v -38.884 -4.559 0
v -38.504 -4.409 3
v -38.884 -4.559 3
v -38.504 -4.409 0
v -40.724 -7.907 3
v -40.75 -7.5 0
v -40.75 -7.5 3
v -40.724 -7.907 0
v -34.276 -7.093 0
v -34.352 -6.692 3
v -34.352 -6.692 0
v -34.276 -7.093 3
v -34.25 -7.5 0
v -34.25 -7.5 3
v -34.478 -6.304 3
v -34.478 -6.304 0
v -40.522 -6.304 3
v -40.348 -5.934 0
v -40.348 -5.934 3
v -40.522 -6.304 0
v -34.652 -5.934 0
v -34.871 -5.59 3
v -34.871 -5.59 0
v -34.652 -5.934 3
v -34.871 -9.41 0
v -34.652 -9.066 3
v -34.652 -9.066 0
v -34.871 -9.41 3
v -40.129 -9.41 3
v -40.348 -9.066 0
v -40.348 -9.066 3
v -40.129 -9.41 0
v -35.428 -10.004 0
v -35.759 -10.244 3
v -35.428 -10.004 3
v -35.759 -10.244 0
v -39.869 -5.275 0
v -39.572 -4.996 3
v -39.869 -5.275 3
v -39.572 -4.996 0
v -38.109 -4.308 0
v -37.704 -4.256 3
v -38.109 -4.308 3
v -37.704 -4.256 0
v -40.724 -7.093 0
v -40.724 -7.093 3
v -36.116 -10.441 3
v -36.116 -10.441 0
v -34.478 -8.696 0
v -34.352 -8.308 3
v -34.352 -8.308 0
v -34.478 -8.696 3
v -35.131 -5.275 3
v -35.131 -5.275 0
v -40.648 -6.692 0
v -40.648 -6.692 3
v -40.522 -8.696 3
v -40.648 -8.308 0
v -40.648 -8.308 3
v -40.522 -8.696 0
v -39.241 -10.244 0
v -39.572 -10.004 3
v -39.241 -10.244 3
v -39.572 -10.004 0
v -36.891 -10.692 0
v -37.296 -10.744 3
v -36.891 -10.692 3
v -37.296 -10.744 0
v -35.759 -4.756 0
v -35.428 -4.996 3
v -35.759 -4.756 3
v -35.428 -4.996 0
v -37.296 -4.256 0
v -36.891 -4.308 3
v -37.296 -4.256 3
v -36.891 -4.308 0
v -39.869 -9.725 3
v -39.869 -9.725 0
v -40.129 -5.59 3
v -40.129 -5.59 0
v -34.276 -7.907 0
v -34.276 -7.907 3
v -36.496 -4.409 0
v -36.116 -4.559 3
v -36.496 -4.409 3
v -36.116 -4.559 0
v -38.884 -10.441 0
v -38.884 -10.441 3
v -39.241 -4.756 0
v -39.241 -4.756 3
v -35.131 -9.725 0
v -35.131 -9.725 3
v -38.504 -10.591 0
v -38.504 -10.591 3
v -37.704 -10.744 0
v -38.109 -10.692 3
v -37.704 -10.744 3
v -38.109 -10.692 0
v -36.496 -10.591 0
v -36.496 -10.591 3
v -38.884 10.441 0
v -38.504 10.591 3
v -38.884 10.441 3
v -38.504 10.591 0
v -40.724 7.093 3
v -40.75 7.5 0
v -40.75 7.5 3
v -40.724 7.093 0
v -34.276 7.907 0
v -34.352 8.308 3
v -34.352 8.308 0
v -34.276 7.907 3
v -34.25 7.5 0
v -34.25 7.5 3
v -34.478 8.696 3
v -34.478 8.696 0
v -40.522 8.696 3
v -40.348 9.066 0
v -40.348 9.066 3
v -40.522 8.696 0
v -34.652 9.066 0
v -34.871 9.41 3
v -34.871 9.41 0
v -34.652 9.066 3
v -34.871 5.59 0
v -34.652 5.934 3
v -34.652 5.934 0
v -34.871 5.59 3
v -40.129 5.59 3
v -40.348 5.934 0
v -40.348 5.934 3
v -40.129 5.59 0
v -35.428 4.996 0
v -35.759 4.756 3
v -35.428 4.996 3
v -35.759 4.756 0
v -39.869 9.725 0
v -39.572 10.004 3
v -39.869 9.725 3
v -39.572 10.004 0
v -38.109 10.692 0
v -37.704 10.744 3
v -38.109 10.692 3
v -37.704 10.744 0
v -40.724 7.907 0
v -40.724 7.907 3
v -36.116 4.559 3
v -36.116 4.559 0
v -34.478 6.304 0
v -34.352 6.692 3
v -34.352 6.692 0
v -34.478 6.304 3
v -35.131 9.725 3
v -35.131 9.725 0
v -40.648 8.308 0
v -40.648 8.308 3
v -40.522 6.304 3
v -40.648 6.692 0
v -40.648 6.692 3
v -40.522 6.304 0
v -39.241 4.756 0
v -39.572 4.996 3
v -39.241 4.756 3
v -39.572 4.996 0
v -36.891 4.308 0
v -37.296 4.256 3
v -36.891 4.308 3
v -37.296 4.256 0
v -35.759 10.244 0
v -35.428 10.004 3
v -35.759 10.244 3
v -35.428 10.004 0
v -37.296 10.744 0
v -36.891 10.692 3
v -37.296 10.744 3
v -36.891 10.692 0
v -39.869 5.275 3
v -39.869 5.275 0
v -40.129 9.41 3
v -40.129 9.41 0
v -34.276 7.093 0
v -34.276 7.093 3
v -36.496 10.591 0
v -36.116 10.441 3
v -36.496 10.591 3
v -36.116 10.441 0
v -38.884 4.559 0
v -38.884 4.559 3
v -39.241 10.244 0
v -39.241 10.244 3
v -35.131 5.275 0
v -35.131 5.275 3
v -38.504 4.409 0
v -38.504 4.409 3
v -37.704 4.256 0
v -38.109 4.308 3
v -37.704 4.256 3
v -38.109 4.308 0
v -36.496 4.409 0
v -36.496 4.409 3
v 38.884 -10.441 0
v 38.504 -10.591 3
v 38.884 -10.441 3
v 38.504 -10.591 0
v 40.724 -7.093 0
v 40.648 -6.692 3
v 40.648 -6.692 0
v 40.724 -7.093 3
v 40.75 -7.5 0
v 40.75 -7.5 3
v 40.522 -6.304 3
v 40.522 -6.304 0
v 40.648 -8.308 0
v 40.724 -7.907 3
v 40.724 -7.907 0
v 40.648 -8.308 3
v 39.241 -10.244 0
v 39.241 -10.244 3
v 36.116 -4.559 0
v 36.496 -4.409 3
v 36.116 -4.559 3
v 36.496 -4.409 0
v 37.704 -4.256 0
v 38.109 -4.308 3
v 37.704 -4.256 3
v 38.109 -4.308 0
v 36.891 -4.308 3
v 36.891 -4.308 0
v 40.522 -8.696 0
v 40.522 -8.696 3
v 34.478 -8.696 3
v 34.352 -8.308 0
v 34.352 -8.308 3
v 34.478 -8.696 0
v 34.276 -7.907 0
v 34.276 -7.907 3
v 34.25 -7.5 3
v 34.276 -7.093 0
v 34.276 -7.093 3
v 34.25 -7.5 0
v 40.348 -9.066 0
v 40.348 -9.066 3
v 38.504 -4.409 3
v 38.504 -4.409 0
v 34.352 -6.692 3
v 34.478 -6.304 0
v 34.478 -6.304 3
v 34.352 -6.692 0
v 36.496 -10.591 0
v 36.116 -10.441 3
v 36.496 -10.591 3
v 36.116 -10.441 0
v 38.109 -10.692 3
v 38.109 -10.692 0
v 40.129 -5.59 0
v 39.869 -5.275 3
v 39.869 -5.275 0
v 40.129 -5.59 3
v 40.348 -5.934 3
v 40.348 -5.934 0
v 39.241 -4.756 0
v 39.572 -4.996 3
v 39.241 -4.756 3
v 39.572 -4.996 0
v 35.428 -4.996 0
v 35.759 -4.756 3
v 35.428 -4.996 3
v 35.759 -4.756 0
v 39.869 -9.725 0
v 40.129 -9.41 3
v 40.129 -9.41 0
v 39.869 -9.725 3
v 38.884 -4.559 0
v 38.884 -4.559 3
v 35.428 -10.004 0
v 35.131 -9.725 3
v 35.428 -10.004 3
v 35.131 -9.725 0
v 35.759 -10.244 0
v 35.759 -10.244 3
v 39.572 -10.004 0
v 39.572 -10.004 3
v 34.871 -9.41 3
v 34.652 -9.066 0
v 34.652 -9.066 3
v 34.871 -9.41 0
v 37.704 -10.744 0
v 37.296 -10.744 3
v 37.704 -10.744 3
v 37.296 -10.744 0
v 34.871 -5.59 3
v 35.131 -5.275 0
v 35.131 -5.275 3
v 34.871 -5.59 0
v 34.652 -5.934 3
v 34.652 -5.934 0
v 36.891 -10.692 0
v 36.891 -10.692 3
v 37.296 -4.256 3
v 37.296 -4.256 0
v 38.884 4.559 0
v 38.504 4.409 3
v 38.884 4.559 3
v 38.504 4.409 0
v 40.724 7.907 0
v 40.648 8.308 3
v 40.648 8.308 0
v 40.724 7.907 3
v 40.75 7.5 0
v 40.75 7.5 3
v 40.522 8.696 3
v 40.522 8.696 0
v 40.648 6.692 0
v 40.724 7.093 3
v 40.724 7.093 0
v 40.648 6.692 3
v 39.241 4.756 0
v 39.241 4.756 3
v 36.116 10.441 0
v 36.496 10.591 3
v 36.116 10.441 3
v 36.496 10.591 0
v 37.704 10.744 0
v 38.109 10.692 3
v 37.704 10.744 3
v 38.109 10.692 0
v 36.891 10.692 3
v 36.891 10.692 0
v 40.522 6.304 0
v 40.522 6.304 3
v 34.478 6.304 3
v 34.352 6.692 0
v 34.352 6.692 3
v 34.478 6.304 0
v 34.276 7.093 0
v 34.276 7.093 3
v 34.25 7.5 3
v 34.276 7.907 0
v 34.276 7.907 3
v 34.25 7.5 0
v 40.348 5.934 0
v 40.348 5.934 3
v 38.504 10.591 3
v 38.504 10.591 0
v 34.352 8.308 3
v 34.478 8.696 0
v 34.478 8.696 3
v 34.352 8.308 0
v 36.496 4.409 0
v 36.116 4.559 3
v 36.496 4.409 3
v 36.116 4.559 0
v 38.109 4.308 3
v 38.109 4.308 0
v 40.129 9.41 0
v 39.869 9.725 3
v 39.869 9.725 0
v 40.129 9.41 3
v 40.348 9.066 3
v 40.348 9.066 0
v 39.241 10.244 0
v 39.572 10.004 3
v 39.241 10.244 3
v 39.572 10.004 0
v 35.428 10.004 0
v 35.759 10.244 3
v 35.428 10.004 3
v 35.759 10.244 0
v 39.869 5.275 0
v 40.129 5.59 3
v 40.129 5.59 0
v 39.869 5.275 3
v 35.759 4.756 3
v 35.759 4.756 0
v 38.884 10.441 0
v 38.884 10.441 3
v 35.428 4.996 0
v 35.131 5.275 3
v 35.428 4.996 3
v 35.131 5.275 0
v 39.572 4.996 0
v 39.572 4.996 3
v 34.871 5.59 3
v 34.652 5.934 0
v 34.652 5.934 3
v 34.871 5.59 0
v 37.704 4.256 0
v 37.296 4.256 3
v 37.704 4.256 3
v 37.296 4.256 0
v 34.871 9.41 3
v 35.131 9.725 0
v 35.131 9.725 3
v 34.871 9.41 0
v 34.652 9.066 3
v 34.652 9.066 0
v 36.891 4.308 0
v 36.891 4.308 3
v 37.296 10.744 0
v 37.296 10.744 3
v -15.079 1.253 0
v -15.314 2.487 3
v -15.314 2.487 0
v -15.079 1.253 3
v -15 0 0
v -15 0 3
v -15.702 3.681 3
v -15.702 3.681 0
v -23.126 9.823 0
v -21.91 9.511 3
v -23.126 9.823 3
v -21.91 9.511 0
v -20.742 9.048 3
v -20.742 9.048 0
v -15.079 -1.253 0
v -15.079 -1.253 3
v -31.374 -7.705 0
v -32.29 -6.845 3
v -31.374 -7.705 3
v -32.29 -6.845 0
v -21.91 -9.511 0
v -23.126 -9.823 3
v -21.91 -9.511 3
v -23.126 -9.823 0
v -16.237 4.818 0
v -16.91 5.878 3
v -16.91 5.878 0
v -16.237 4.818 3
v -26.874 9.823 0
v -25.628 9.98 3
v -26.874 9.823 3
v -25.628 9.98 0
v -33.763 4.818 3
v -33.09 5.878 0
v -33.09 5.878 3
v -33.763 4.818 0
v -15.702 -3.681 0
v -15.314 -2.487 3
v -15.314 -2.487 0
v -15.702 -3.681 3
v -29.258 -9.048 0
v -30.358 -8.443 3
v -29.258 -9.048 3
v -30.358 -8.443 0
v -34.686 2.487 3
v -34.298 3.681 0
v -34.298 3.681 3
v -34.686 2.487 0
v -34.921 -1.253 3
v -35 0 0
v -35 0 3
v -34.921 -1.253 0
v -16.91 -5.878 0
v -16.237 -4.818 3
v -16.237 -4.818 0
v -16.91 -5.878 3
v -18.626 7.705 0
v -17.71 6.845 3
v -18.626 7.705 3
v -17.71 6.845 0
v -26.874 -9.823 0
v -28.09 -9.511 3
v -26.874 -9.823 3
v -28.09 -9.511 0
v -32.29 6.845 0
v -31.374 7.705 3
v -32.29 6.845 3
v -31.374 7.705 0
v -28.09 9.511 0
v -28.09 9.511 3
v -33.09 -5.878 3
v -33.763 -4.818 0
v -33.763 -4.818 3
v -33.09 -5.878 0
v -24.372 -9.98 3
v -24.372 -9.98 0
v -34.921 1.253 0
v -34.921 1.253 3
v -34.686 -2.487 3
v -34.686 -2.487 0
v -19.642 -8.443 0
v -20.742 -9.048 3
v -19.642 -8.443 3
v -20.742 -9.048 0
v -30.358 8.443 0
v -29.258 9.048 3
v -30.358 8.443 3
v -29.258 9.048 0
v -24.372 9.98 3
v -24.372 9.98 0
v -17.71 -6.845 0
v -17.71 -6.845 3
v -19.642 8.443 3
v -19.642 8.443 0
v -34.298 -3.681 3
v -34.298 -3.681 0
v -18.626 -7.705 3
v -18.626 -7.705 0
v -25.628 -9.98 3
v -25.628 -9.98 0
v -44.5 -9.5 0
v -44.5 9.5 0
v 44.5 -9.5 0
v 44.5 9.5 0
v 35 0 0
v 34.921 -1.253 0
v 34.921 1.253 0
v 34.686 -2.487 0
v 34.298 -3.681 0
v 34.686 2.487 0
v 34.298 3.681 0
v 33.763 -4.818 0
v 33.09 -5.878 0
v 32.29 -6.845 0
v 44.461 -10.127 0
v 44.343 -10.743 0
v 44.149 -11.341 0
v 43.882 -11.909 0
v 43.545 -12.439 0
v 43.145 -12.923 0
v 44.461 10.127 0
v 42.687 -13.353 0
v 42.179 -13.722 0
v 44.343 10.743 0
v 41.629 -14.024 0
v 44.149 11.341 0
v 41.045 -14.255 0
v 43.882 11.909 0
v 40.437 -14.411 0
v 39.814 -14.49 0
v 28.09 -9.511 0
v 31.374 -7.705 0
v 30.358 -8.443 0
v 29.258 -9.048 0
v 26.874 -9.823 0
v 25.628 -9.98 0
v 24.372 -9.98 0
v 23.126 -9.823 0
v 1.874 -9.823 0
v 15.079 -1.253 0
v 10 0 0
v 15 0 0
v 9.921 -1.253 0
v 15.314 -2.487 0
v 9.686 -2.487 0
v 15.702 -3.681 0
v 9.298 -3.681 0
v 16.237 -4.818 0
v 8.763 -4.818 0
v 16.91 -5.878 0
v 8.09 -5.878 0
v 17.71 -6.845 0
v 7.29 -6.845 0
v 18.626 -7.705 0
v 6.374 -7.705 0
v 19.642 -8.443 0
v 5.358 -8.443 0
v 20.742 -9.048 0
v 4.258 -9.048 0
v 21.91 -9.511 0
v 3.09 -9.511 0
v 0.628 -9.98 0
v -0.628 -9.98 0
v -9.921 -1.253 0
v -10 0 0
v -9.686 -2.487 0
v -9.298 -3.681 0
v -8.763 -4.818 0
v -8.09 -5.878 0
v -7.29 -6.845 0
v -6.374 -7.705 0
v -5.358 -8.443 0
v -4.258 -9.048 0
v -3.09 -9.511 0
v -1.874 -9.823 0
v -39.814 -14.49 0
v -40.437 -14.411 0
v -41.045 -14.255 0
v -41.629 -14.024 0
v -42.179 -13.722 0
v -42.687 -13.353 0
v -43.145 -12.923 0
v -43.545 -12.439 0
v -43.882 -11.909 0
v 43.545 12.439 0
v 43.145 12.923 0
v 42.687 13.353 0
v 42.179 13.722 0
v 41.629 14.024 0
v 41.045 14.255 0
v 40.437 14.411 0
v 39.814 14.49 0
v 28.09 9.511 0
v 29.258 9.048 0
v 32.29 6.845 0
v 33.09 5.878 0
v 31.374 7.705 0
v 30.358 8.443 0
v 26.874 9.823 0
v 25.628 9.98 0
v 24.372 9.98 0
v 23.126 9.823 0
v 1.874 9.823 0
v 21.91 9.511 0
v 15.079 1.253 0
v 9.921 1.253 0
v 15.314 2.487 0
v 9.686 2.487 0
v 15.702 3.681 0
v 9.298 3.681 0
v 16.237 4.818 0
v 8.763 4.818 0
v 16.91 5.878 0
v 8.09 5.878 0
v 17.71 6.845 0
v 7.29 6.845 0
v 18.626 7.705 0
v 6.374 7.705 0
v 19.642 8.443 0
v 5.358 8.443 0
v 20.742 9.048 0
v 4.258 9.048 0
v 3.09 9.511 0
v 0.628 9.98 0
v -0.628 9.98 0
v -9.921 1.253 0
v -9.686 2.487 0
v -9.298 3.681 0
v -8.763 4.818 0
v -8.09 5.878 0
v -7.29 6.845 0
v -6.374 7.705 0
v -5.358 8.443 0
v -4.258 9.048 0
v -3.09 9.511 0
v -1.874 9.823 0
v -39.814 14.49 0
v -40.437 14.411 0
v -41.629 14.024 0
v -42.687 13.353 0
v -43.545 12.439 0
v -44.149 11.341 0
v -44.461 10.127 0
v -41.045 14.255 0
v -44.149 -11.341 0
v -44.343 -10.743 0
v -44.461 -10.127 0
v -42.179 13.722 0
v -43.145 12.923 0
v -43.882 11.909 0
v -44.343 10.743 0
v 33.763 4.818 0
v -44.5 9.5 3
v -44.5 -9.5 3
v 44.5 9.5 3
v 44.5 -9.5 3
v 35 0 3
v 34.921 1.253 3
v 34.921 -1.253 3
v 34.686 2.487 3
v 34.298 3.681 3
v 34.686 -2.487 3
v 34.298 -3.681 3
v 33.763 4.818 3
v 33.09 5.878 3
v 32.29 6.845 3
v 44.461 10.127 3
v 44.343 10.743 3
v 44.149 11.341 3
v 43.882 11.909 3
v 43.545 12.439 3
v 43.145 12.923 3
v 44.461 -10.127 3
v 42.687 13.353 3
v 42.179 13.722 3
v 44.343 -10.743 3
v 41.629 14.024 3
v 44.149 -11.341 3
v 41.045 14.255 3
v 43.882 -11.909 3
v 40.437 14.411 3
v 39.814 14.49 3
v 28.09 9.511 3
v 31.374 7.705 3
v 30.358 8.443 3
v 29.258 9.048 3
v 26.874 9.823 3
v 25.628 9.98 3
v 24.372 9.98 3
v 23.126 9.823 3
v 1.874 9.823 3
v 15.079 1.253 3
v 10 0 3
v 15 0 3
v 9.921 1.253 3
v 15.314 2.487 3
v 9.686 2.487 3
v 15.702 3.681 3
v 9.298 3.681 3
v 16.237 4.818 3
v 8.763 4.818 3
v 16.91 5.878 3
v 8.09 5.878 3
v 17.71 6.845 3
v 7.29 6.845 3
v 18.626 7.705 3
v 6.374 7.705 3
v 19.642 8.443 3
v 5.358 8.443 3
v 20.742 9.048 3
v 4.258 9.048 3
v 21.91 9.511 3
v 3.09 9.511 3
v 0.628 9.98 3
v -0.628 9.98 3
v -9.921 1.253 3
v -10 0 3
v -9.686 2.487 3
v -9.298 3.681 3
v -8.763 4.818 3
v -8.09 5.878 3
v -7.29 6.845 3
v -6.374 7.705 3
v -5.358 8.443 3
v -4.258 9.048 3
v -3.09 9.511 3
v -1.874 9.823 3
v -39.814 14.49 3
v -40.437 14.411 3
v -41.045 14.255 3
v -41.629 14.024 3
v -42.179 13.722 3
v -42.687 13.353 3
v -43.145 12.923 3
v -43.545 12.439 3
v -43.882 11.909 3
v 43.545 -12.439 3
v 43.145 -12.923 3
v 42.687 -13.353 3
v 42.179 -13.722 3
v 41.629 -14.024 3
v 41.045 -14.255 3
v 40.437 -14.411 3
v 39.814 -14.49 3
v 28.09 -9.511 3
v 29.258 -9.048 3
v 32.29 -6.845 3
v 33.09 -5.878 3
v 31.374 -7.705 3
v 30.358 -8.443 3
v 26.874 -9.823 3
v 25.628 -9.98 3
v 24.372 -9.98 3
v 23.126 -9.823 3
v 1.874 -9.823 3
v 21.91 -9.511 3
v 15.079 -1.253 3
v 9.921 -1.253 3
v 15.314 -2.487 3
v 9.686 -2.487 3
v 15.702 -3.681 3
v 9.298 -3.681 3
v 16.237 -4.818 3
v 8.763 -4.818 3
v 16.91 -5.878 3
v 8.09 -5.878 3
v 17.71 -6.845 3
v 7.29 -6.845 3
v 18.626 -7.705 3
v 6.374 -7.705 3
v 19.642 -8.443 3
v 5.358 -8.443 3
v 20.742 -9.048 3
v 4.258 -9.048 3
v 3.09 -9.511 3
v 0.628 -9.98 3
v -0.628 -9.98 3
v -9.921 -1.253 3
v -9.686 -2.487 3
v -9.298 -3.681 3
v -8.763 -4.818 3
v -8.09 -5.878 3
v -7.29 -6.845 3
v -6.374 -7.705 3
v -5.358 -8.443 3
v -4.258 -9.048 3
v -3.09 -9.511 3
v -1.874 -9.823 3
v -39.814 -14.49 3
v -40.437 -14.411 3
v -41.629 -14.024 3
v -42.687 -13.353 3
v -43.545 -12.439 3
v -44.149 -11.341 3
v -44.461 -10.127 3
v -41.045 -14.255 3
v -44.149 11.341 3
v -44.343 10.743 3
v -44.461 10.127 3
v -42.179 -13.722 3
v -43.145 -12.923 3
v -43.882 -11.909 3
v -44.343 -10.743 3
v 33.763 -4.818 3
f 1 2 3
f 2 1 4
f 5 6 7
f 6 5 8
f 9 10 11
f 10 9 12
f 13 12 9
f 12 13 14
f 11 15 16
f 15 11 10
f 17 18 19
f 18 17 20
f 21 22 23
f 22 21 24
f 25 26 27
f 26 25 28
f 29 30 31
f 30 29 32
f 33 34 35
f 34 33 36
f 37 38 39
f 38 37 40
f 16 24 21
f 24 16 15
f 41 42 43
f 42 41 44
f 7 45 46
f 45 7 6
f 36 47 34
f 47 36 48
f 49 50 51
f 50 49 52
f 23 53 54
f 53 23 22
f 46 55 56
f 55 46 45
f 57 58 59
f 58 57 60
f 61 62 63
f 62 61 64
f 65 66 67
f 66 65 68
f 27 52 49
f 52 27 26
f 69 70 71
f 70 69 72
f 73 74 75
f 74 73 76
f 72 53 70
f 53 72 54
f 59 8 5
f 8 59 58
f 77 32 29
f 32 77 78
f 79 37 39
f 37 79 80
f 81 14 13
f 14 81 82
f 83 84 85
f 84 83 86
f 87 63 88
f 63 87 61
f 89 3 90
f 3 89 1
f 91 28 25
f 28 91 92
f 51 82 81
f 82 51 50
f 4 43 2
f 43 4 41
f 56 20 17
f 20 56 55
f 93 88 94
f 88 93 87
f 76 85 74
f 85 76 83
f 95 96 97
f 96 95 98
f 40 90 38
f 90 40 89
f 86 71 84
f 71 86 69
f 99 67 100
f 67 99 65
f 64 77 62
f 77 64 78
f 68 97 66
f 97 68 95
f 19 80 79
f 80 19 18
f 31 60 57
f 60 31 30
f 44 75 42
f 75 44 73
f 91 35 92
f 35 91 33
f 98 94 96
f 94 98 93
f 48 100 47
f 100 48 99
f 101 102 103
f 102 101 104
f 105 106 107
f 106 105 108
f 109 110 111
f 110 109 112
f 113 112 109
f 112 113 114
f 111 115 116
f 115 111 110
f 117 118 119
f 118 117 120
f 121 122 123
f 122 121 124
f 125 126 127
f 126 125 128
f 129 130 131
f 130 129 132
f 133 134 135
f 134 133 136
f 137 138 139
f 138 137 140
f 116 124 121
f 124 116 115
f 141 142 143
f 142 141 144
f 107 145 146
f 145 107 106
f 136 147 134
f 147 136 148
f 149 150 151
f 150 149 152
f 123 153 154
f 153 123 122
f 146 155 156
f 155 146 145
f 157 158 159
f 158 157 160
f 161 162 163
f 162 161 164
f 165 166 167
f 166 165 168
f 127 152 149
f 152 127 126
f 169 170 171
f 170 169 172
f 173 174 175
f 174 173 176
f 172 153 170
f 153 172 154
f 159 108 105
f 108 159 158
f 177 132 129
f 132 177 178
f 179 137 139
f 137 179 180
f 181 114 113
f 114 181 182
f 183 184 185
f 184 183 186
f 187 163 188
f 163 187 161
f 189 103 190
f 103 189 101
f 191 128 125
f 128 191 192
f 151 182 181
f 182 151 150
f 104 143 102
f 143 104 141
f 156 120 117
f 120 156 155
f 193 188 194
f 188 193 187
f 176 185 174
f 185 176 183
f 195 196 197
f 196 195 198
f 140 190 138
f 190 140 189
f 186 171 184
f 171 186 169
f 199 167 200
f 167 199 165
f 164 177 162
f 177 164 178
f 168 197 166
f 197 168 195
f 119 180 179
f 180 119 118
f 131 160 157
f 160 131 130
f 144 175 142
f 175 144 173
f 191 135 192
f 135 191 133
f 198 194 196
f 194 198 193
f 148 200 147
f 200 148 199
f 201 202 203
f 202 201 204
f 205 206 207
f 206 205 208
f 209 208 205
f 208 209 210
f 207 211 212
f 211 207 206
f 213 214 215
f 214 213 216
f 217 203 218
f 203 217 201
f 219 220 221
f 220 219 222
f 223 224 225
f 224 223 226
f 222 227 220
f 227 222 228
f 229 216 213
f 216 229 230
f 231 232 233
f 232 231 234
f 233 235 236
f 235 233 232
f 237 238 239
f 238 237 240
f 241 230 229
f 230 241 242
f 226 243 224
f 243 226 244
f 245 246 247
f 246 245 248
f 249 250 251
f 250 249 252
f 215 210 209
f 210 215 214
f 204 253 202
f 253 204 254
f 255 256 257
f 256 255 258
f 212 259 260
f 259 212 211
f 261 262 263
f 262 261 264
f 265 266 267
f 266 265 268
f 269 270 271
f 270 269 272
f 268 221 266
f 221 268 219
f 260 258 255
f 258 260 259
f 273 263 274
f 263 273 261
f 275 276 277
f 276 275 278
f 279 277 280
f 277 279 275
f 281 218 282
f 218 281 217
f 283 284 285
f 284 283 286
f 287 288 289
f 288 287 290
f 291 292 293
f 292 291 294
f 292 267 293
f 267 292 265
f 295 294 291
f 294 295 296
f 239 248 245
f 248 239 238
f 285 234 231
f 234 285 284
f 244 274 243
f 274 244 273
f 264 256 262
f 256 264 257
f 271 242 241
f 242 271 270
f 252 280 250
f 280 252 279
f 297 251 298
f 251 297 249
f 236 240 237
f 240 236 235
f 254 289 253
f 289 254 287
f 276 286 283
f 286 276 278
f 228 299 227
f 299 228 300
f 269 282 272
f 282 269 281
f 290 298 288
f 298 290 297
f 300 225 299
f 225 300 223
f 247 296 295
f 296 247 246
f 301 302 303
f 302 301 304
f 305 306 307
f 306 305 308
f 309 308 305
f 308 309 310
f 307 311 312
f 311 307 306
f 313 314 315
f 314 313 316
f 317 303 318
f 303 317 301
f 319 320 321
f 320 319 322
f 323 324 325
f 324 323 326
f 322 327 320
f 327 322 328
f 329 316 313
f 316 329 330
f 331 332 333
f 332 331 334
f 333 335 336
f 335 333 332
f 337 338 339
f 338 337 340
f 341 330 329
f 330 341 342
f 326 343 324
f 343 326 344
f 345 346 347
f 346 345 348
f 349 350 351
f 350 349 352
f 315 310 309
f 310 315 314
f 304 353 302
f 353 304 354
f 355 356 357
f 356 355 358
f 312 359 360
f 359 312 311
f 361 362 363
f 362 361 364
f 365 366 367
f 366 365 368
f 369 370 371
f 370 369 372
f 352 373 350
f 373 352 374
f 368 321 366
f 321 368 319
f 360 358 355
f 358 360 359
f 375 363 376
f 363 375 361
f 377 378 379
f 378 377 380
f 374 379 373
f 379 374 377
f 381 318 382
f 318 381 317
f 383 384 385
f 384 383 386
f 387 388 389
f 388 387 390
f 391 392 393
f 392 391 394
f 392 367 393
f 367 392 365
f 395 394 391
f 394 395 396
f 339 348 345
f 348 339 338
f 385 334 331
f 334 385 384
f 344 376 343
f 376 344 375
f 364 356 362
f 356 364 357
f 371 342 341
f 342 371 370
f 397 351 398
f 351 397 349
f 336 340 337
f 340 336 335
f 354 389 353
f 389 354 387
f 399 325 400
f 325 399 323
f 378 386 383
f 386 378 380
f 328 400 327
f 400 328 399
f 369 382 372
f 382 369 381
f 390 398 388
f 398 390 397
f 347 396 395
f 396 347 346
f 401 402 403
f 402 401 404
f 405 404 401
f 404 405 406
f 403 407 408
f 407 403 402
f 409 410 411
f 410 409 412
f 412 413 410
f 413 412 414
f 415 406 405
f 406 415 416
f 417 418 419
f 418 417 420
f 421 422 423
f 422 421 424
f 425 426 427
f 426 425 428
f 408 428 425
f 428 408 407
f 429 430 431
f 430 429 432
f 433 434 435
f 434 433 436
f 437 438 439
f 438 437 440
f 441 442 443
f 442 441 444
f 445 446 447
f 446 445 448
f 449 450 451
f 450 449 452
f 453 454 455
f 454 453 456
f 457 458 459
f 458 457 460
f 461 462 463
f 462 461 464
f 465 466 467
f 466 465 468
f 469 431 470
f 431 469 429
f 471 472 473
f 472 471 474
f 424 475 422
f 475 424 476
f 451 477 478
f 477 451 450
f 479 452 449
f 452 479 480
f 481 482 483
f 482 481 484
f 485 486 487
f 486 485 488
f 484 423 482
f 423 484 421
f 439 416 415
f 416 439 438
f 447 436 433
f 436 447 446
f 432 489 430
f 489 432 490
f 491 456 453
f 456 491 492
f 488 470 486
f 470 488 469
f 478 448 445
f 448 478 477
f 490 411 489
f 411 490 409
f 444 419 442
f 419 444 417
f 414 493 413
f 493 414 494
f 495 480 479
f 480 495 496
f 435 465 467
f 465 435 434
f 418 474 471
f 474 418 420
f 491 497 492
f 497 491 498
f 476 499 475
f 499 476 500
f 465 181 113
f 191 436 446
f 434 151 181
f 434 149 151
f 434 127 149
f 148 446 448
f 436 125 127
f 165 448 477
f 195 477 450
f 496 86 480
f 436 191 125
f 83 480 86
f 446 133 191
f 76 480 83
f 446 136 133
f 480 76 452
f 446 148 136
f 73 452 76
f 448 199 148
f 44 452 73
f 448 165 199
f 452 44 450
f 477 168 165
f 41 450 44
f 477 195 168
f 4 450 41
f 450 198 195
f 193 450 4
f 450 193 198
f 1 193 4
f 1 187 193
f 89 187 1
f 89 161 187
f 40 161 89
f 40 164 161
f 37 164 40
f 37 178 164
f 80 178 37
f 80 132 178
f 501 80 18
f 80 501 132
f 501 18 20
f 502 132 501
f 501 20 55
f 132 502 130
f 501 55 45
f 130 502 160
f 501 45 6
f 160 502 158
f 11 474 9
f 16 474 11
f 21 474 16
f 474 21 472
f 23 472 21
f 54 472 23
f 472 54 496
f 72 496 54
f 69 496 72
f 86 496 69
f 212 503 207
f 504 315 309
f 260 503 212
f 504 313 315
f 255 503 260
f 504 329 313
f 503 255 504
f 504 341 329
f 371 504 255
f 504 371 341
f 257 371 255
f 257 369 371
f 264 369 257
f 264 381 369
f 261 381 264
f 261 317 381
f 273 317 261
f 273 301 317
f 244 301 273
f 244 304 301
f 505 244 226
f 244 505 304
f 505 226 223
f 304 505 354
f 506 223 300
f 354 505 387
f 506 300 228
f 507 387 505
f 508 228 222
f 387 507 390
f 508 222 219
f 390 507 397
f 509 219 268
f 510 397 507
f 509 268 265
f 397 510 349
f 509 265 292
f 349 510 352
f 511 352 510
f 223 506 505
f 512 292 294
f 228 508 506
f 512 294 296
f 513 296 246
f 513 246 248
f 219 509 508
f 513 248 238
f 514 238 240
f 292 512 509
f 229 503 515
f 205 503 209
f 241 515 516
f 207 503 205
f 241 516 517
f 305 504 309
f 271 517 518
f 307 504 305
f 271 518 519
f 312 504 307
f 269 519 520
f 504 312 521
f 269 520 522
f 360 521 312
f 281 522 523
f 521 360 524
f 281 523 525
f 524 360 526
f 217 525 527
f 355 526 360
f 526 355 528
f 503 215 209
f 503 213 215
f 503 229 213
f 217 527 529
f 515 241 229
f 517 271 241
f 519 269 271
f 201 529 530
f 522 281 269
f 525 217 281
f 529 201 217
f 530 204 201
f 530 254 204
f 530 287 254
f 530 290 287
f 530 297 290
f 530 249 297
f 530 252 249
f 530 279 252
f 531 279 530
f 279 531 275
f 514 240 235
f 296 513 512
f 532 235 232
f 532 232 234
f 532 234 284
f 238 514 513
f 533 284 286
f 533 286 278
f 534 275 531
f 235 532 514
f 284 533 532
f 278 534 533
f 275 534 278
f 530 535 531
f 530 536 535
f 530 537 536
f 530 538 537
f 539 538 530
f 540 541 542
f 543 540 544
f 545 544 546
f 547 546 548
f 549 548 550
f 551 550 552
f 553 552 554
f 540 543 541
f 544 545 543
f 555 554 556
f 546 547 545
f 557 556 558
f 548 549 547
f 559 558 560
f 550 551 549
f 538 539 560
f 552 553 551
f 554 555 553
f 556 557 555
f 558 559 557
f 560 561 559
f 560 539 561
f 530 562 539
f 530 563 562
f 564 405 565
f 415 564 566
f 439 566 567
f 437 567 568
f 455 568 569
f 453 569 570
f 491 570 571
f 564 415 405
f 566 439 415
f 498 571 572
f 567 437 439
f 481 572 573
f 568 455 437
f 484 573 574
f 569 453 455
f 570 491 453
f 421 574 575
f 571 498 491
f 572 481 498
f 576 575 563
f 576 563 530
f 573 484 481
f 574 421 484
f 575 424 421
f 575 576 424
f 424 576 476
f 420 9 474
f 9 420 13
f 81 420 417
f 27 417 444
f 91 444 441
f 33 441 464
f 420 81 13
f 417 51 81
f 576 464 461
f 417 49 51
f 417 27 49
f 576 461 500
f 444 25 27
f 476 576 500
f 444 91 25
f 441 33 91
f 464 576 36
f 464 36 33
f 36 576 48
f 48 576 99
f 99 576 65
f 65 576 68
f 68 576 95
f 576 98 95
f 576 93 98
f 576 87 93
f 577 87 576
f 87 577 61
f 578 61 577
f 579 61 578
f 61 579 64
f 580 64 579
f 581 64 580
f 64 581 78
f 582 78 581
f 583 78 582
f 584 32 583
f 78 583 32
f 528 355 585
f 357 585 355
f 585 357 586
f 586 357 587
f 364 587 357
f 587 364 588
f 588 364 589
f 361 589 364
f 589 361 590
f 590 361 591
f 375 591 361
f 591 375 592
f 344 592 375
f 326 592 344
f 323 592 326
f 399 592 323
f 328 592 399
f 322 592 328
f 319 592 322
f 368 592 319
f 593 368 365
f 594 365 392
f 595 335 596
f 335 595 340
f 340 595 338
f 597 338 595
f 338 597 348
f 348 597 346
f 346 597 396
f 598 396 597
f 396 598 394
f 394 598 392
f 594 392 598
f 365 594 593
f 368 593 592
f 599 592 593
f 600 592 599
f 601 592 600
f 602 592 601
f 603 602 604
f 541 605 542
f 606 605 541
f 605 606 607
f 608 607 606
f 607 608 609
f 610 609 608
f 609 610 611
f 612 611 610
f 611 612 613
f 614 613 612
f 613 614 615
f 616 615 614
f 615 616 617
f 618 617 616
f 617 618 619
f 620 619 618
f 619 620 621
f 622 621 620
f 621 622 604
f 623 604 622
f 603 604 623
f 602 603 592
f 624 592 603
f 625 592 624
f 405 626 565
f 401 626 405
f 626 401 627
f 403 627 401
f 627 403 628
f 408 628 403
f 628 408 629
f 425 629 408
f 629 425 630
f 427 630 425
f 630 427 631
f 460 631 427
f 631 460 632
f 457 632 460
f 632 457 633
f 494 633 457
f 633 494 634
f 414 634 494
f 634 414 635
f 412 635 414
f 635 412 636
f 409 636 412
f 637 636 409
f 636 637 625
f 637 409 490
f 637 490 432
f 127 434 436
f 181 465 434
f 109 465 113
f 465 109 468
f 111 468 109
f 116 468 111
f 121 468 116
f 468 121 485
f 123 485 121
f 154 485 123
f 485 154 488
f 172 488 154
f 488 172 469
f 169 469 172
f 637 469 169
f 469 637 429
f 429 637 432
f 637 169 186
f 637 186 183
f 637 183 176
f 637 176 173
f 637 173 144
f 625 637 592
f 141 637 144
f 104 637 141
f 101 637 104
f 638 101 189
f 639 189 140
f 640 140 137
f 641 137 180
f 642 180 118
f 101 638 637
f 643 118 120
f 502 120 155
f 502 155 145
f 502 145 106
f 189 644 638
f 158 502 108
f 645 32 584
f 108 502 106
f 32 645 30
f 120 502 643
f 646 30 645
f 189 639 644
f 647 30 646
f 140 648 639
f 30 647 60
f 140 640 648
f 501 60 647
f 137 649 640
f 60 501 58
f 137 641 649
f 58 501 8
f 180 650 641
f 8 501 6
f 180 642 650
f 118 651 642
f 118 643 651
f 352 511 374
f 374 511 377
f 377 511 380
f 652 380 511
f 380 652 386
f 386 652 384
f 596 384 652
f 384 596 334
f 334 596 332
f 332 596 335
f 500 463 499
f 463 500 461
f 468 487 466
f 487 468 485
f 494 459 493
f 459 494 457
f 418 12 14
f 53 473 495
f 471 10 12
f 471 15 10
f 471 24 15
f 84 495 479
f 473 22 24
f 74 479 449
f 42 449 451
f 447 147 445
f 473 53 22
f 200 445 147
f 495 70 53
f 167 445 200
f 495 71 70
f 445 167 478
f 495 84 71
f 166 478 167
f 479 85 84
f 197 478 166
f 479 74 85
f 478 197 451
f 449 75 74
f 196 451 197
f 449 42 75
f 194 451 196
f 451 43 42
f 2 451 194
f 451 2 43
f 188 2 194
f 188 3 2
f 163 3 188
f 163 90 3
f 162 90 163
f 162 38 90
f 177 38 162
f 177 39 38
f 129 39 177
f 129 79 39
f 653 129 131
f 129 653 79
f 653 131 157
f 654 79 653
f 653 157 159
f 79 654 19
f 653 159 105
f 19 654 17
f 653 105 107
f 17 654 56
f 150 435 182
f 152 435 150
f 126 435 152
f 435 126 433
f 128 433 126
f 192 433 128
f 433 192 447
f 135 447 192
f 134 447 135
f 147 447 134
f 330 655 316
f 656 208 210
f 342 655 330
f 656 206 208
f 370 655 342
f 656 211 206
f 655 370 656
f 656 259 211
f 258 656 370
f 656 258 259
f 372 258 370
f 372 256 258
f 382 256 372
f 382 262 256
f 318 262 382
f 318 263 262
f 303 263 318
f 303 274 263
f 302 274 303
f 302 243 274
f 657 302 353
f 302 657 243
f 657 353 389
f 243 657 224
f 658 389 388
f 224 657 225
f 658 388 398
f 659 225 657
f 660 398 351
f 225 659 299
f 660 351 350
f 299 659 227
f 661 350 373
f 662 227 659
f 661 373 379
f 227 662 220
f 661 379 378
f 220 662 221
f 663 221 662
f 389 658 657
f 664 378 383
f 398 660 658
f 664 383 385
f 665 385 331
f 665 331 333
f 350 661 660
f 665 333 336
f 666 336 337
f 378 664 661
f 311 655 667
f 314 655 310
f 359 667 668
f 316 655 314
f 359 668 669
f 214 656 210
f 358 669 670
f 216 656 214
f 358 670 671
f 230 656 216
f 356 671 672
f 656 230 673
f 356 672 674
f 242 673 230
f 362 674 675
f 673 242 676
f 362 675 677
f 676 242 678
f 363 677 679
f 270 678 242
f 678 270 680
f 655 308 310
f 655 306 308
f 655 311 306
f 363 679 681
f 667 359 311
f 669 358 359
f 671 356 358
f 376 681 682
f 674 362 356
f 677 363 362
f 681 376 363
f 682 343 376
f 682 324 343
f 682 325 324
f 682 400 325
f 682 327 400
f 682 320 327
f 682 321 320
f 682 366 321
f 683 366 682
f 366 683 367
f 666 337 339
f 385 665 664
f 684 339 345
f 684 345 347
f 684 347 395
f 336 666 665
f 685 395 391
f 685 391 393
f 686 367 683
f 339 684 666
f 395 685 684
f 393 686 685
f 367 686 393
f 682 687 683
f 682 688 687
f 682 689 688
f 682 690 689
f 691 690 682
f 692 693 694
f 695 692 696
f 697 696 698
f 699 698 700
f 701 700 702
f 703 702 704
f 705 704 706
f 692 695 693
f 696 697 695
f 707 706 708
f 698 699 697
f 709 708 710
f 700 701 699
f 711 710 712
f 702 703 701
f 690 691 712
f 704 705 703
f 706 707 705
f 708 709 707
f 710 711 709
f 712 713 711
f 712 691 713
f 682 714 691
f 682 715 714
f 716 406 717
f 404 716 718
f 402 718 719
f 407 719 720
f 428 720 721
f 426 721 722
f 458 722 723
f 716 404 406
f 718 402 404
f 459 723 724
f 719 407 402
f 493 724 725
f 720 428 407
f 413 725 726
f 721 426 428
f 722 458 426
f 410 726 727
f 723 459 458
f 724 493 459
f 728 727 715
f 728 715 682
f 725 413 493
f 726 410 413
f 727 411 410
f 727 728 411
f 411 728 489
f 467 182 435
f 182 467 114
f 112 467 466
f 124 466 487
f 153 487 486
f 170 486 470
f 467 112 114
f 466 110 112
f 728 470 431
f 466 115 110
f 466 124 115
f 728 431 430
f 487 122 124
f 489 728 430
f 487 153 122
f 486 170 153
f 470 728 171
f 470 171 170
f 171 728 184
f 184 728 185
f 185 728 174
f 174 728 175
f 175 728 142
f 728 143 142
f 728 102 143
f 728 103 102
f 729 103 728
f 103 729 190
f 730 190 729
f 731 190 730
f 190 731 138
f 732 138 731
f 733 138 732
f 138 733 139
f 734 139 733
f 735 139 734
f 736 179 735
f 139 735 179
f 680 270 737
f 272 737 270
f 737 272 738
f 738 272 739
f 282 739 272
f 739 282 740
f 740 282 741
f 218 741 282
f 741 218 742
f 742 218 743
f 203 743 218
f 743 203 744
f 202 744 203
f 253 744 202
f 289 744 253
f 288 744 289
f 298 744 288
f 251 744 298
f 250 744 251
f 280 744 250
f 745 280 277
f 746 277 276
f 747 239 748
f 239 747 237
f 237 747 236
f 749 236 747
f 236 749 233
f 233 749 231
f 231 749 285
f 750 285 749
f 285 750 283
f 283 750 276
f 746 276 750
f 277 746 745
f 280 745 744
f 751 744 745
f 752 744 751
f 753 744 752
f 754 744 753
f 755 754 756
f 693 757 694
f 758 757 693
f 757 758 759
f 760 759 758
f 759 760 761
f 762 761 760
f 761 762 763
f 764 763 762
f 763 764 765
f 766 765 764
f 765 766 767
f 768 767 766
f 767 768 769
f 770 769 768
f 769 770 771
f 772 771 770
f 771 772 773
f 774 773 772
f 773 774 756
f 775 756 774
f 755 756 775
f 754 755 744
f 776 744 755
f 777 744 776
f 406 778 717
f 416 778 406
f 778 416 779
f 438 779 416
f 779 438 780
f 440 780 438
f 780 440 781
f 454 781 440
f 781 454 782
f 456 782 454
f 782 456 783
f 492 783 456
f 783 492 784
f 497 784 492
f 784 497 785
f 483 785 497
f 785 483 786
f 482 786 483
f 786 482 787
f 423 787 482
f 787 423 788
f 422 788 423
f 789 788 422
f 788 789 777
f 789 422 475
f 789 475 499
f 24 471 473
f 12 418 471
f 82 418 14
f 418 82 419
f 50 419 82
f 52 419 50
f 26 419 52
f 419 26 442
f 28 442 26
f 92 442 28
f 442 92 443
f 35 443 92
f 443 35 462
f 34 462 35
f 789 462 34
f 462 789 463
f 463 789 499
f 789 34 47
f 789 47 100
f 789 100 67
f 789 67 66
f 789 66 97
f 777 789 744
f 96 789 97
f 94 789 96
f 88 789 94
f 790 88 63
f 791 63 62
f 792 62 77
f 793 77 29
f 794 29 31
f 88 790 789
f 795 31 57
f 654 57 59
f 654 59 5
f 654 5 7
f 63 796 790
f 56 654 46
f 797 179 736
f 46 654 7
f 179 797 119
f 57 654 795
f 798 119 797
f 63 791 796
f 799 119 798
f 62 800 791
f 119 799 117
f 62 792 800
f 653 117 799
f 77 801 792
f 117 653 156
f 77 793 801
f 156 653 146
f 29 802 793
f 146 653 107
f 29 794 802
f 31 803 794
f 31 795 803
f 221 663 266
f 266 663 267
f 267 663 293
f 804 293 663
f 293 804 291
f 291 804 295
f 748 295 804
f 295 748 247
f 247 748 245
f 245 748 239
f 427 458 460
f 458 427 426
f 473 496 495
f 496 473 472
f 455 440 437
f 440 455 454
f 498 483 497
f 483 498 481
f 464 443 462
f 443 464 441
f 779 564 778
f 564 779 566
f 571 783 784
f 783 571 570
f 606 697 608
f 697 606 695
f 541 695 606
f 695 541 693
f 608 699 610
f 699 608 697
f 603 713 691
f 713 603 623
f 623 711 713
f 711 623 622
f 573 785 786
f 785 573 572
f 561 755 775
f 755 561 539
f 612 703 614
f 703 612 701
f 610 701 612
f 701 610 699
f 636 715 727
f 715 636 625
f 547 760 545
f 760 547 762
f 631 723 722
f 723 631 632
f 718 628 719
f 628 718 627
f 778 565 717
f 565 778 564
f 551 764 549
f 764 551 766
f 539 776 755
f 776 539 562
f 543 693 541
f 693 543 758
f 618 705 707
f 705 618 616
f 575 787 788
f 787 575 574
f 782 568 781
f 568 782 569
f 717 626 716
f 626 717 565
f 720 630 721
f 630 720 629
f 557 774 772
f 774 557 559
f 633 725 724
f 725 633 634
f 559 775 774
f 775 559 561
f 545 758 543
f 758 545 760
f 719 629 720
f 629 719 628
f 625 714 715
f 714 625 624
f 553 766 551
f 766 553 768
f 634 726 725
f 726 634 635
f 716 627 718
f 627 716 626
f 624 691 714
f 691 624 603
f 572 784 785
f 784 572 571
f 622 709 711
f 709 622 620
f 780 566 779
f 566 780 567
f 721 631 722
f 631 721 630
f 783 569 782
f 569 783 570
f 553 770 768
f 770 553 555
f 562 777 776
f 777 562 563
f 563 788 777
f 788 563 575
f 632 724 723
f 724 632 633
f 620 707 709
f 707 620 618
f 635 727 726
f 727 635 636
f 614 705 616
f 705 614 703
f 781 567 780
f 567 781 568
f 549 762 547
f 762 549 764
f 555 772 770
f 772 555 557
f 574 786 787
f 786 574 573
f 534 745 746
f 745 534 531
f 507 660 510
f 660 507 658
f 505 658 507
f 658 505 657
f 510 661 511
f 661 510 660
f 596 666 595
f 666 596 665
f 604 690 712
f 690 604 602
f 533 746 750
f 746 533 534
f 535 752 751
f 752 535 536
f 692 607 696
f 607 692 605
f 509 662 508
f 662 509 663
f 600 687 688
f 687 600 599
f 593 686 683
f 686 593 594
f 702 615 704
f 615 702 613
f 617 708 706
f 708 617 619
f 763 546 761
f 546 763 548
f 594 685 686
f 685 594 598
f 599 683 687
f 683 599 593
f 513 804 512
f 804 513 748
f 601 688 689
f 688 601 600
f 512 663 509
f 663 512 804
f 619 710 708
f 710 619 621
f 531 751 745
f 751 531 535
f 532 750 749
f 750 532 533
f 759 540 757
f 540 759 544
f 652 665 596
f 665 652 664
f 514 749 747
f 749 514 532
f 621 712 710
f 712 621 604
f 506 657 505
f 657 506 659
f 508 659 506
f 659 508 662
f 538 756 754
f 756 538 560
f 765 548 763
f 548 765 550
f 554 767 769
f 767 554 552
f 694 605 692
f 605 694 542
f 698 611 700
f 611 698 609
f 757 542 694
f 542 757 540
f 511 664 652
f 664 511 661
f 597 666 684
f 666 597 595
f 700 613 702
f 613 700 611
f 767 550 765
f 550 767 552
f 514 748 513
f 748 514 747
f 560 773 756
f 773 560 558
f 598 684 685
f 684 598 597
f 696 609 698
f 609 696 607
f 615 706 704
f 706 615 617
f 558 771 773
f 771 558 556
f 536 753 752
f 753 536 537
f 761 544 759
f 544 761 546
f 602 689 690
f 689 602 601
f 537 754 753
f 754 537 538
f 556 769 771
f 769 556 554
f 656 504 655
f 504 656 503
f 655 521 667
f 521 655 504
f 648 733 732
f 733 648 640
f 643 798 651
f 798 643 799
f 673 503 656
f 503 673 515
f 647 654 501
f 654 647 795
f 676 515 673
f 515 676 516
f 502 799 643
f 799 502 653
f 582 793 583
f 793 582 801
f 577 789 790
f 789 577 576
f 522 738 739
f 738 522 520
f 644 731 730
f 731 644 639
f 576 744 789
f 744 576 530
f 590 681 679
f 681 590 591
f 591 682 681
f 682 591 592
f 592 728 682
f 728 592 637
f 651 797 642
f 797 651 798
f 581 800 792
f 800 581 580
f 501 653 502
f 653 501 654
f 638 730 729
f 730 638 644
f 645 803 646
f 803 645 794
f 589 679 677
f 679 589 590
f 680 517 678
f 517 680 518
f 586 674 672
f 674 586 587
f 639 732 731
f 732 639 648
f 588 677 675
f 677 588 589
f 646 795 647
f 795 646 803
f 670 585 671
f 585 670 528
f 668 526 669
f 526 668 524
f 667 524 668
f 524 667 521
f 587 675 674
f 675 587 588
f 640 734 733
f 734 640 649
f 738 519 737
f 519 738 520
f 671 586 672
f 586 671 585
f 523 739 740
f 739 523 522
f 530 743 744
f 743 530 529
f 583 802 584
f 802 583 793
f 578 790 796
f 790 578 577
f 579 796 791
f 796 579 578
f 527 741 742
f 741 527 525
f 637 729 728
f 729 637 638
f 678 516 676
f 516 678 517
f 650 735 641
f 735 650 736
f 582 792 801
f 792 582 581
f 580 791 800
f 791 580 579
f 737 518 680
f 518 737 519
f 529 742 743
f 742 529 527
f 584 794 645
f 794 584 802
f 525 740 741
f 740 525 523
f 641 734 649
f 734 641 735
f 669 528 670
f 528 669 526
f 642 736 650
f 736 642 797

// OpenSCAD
$fn = 50;


difference() {
	union() {
		hull() {
			translate(v = [-39.5000000000, 9.5000000000, 0]) {
				cylinder(h = 3, r = 5);
			}
			translate(v = [39.5000000000, 9.5000000000, 0]) {
				cylinder(h = 3, r = 5);
			}
			translate(v = [-39.5000000000, -9.5000000000, 0]) {
				cylinder(h = 3, r = 5);
			}
			translate(v = [39.5000000000, -9.5000000000, 0]) {
				cylinder(h = 3, r = 5);
			}
		}
	}
	union() {
		#translate(v = [-37.5000000000, -7.5000000000, -100.0000000000]) {
			cylinder(h = 200, r = 3.2500000000);
		}
		#translate(v = [-37.5000000000, 7.5000000000, -100.0000000000]) {
			cylinder(h = 200, r = 3.2500000000);
		}
		#translate(v = [37.5000000000, -7.5000000000, -100.0000000000]) {
			cylinder(h = 200, r = 3.2500000000);
		}
		#translate(v = [37.5000000000, 7.5000000000, -100.0000000000]) {
			cylinder(h = 200, r = 3.2500000000);
		}
		#translate(v = [-25.0000000000, 0, 0]) {
			cylinder(h = 3, r = 10.0000000000);
		}
		#cylinder(h = 3, r = 10.0000000000);
		#translate(v = [25.0000000000, 0, 0]) {
			cylinder(h = 3, r = 10.0000000000);
		}
	}
}
